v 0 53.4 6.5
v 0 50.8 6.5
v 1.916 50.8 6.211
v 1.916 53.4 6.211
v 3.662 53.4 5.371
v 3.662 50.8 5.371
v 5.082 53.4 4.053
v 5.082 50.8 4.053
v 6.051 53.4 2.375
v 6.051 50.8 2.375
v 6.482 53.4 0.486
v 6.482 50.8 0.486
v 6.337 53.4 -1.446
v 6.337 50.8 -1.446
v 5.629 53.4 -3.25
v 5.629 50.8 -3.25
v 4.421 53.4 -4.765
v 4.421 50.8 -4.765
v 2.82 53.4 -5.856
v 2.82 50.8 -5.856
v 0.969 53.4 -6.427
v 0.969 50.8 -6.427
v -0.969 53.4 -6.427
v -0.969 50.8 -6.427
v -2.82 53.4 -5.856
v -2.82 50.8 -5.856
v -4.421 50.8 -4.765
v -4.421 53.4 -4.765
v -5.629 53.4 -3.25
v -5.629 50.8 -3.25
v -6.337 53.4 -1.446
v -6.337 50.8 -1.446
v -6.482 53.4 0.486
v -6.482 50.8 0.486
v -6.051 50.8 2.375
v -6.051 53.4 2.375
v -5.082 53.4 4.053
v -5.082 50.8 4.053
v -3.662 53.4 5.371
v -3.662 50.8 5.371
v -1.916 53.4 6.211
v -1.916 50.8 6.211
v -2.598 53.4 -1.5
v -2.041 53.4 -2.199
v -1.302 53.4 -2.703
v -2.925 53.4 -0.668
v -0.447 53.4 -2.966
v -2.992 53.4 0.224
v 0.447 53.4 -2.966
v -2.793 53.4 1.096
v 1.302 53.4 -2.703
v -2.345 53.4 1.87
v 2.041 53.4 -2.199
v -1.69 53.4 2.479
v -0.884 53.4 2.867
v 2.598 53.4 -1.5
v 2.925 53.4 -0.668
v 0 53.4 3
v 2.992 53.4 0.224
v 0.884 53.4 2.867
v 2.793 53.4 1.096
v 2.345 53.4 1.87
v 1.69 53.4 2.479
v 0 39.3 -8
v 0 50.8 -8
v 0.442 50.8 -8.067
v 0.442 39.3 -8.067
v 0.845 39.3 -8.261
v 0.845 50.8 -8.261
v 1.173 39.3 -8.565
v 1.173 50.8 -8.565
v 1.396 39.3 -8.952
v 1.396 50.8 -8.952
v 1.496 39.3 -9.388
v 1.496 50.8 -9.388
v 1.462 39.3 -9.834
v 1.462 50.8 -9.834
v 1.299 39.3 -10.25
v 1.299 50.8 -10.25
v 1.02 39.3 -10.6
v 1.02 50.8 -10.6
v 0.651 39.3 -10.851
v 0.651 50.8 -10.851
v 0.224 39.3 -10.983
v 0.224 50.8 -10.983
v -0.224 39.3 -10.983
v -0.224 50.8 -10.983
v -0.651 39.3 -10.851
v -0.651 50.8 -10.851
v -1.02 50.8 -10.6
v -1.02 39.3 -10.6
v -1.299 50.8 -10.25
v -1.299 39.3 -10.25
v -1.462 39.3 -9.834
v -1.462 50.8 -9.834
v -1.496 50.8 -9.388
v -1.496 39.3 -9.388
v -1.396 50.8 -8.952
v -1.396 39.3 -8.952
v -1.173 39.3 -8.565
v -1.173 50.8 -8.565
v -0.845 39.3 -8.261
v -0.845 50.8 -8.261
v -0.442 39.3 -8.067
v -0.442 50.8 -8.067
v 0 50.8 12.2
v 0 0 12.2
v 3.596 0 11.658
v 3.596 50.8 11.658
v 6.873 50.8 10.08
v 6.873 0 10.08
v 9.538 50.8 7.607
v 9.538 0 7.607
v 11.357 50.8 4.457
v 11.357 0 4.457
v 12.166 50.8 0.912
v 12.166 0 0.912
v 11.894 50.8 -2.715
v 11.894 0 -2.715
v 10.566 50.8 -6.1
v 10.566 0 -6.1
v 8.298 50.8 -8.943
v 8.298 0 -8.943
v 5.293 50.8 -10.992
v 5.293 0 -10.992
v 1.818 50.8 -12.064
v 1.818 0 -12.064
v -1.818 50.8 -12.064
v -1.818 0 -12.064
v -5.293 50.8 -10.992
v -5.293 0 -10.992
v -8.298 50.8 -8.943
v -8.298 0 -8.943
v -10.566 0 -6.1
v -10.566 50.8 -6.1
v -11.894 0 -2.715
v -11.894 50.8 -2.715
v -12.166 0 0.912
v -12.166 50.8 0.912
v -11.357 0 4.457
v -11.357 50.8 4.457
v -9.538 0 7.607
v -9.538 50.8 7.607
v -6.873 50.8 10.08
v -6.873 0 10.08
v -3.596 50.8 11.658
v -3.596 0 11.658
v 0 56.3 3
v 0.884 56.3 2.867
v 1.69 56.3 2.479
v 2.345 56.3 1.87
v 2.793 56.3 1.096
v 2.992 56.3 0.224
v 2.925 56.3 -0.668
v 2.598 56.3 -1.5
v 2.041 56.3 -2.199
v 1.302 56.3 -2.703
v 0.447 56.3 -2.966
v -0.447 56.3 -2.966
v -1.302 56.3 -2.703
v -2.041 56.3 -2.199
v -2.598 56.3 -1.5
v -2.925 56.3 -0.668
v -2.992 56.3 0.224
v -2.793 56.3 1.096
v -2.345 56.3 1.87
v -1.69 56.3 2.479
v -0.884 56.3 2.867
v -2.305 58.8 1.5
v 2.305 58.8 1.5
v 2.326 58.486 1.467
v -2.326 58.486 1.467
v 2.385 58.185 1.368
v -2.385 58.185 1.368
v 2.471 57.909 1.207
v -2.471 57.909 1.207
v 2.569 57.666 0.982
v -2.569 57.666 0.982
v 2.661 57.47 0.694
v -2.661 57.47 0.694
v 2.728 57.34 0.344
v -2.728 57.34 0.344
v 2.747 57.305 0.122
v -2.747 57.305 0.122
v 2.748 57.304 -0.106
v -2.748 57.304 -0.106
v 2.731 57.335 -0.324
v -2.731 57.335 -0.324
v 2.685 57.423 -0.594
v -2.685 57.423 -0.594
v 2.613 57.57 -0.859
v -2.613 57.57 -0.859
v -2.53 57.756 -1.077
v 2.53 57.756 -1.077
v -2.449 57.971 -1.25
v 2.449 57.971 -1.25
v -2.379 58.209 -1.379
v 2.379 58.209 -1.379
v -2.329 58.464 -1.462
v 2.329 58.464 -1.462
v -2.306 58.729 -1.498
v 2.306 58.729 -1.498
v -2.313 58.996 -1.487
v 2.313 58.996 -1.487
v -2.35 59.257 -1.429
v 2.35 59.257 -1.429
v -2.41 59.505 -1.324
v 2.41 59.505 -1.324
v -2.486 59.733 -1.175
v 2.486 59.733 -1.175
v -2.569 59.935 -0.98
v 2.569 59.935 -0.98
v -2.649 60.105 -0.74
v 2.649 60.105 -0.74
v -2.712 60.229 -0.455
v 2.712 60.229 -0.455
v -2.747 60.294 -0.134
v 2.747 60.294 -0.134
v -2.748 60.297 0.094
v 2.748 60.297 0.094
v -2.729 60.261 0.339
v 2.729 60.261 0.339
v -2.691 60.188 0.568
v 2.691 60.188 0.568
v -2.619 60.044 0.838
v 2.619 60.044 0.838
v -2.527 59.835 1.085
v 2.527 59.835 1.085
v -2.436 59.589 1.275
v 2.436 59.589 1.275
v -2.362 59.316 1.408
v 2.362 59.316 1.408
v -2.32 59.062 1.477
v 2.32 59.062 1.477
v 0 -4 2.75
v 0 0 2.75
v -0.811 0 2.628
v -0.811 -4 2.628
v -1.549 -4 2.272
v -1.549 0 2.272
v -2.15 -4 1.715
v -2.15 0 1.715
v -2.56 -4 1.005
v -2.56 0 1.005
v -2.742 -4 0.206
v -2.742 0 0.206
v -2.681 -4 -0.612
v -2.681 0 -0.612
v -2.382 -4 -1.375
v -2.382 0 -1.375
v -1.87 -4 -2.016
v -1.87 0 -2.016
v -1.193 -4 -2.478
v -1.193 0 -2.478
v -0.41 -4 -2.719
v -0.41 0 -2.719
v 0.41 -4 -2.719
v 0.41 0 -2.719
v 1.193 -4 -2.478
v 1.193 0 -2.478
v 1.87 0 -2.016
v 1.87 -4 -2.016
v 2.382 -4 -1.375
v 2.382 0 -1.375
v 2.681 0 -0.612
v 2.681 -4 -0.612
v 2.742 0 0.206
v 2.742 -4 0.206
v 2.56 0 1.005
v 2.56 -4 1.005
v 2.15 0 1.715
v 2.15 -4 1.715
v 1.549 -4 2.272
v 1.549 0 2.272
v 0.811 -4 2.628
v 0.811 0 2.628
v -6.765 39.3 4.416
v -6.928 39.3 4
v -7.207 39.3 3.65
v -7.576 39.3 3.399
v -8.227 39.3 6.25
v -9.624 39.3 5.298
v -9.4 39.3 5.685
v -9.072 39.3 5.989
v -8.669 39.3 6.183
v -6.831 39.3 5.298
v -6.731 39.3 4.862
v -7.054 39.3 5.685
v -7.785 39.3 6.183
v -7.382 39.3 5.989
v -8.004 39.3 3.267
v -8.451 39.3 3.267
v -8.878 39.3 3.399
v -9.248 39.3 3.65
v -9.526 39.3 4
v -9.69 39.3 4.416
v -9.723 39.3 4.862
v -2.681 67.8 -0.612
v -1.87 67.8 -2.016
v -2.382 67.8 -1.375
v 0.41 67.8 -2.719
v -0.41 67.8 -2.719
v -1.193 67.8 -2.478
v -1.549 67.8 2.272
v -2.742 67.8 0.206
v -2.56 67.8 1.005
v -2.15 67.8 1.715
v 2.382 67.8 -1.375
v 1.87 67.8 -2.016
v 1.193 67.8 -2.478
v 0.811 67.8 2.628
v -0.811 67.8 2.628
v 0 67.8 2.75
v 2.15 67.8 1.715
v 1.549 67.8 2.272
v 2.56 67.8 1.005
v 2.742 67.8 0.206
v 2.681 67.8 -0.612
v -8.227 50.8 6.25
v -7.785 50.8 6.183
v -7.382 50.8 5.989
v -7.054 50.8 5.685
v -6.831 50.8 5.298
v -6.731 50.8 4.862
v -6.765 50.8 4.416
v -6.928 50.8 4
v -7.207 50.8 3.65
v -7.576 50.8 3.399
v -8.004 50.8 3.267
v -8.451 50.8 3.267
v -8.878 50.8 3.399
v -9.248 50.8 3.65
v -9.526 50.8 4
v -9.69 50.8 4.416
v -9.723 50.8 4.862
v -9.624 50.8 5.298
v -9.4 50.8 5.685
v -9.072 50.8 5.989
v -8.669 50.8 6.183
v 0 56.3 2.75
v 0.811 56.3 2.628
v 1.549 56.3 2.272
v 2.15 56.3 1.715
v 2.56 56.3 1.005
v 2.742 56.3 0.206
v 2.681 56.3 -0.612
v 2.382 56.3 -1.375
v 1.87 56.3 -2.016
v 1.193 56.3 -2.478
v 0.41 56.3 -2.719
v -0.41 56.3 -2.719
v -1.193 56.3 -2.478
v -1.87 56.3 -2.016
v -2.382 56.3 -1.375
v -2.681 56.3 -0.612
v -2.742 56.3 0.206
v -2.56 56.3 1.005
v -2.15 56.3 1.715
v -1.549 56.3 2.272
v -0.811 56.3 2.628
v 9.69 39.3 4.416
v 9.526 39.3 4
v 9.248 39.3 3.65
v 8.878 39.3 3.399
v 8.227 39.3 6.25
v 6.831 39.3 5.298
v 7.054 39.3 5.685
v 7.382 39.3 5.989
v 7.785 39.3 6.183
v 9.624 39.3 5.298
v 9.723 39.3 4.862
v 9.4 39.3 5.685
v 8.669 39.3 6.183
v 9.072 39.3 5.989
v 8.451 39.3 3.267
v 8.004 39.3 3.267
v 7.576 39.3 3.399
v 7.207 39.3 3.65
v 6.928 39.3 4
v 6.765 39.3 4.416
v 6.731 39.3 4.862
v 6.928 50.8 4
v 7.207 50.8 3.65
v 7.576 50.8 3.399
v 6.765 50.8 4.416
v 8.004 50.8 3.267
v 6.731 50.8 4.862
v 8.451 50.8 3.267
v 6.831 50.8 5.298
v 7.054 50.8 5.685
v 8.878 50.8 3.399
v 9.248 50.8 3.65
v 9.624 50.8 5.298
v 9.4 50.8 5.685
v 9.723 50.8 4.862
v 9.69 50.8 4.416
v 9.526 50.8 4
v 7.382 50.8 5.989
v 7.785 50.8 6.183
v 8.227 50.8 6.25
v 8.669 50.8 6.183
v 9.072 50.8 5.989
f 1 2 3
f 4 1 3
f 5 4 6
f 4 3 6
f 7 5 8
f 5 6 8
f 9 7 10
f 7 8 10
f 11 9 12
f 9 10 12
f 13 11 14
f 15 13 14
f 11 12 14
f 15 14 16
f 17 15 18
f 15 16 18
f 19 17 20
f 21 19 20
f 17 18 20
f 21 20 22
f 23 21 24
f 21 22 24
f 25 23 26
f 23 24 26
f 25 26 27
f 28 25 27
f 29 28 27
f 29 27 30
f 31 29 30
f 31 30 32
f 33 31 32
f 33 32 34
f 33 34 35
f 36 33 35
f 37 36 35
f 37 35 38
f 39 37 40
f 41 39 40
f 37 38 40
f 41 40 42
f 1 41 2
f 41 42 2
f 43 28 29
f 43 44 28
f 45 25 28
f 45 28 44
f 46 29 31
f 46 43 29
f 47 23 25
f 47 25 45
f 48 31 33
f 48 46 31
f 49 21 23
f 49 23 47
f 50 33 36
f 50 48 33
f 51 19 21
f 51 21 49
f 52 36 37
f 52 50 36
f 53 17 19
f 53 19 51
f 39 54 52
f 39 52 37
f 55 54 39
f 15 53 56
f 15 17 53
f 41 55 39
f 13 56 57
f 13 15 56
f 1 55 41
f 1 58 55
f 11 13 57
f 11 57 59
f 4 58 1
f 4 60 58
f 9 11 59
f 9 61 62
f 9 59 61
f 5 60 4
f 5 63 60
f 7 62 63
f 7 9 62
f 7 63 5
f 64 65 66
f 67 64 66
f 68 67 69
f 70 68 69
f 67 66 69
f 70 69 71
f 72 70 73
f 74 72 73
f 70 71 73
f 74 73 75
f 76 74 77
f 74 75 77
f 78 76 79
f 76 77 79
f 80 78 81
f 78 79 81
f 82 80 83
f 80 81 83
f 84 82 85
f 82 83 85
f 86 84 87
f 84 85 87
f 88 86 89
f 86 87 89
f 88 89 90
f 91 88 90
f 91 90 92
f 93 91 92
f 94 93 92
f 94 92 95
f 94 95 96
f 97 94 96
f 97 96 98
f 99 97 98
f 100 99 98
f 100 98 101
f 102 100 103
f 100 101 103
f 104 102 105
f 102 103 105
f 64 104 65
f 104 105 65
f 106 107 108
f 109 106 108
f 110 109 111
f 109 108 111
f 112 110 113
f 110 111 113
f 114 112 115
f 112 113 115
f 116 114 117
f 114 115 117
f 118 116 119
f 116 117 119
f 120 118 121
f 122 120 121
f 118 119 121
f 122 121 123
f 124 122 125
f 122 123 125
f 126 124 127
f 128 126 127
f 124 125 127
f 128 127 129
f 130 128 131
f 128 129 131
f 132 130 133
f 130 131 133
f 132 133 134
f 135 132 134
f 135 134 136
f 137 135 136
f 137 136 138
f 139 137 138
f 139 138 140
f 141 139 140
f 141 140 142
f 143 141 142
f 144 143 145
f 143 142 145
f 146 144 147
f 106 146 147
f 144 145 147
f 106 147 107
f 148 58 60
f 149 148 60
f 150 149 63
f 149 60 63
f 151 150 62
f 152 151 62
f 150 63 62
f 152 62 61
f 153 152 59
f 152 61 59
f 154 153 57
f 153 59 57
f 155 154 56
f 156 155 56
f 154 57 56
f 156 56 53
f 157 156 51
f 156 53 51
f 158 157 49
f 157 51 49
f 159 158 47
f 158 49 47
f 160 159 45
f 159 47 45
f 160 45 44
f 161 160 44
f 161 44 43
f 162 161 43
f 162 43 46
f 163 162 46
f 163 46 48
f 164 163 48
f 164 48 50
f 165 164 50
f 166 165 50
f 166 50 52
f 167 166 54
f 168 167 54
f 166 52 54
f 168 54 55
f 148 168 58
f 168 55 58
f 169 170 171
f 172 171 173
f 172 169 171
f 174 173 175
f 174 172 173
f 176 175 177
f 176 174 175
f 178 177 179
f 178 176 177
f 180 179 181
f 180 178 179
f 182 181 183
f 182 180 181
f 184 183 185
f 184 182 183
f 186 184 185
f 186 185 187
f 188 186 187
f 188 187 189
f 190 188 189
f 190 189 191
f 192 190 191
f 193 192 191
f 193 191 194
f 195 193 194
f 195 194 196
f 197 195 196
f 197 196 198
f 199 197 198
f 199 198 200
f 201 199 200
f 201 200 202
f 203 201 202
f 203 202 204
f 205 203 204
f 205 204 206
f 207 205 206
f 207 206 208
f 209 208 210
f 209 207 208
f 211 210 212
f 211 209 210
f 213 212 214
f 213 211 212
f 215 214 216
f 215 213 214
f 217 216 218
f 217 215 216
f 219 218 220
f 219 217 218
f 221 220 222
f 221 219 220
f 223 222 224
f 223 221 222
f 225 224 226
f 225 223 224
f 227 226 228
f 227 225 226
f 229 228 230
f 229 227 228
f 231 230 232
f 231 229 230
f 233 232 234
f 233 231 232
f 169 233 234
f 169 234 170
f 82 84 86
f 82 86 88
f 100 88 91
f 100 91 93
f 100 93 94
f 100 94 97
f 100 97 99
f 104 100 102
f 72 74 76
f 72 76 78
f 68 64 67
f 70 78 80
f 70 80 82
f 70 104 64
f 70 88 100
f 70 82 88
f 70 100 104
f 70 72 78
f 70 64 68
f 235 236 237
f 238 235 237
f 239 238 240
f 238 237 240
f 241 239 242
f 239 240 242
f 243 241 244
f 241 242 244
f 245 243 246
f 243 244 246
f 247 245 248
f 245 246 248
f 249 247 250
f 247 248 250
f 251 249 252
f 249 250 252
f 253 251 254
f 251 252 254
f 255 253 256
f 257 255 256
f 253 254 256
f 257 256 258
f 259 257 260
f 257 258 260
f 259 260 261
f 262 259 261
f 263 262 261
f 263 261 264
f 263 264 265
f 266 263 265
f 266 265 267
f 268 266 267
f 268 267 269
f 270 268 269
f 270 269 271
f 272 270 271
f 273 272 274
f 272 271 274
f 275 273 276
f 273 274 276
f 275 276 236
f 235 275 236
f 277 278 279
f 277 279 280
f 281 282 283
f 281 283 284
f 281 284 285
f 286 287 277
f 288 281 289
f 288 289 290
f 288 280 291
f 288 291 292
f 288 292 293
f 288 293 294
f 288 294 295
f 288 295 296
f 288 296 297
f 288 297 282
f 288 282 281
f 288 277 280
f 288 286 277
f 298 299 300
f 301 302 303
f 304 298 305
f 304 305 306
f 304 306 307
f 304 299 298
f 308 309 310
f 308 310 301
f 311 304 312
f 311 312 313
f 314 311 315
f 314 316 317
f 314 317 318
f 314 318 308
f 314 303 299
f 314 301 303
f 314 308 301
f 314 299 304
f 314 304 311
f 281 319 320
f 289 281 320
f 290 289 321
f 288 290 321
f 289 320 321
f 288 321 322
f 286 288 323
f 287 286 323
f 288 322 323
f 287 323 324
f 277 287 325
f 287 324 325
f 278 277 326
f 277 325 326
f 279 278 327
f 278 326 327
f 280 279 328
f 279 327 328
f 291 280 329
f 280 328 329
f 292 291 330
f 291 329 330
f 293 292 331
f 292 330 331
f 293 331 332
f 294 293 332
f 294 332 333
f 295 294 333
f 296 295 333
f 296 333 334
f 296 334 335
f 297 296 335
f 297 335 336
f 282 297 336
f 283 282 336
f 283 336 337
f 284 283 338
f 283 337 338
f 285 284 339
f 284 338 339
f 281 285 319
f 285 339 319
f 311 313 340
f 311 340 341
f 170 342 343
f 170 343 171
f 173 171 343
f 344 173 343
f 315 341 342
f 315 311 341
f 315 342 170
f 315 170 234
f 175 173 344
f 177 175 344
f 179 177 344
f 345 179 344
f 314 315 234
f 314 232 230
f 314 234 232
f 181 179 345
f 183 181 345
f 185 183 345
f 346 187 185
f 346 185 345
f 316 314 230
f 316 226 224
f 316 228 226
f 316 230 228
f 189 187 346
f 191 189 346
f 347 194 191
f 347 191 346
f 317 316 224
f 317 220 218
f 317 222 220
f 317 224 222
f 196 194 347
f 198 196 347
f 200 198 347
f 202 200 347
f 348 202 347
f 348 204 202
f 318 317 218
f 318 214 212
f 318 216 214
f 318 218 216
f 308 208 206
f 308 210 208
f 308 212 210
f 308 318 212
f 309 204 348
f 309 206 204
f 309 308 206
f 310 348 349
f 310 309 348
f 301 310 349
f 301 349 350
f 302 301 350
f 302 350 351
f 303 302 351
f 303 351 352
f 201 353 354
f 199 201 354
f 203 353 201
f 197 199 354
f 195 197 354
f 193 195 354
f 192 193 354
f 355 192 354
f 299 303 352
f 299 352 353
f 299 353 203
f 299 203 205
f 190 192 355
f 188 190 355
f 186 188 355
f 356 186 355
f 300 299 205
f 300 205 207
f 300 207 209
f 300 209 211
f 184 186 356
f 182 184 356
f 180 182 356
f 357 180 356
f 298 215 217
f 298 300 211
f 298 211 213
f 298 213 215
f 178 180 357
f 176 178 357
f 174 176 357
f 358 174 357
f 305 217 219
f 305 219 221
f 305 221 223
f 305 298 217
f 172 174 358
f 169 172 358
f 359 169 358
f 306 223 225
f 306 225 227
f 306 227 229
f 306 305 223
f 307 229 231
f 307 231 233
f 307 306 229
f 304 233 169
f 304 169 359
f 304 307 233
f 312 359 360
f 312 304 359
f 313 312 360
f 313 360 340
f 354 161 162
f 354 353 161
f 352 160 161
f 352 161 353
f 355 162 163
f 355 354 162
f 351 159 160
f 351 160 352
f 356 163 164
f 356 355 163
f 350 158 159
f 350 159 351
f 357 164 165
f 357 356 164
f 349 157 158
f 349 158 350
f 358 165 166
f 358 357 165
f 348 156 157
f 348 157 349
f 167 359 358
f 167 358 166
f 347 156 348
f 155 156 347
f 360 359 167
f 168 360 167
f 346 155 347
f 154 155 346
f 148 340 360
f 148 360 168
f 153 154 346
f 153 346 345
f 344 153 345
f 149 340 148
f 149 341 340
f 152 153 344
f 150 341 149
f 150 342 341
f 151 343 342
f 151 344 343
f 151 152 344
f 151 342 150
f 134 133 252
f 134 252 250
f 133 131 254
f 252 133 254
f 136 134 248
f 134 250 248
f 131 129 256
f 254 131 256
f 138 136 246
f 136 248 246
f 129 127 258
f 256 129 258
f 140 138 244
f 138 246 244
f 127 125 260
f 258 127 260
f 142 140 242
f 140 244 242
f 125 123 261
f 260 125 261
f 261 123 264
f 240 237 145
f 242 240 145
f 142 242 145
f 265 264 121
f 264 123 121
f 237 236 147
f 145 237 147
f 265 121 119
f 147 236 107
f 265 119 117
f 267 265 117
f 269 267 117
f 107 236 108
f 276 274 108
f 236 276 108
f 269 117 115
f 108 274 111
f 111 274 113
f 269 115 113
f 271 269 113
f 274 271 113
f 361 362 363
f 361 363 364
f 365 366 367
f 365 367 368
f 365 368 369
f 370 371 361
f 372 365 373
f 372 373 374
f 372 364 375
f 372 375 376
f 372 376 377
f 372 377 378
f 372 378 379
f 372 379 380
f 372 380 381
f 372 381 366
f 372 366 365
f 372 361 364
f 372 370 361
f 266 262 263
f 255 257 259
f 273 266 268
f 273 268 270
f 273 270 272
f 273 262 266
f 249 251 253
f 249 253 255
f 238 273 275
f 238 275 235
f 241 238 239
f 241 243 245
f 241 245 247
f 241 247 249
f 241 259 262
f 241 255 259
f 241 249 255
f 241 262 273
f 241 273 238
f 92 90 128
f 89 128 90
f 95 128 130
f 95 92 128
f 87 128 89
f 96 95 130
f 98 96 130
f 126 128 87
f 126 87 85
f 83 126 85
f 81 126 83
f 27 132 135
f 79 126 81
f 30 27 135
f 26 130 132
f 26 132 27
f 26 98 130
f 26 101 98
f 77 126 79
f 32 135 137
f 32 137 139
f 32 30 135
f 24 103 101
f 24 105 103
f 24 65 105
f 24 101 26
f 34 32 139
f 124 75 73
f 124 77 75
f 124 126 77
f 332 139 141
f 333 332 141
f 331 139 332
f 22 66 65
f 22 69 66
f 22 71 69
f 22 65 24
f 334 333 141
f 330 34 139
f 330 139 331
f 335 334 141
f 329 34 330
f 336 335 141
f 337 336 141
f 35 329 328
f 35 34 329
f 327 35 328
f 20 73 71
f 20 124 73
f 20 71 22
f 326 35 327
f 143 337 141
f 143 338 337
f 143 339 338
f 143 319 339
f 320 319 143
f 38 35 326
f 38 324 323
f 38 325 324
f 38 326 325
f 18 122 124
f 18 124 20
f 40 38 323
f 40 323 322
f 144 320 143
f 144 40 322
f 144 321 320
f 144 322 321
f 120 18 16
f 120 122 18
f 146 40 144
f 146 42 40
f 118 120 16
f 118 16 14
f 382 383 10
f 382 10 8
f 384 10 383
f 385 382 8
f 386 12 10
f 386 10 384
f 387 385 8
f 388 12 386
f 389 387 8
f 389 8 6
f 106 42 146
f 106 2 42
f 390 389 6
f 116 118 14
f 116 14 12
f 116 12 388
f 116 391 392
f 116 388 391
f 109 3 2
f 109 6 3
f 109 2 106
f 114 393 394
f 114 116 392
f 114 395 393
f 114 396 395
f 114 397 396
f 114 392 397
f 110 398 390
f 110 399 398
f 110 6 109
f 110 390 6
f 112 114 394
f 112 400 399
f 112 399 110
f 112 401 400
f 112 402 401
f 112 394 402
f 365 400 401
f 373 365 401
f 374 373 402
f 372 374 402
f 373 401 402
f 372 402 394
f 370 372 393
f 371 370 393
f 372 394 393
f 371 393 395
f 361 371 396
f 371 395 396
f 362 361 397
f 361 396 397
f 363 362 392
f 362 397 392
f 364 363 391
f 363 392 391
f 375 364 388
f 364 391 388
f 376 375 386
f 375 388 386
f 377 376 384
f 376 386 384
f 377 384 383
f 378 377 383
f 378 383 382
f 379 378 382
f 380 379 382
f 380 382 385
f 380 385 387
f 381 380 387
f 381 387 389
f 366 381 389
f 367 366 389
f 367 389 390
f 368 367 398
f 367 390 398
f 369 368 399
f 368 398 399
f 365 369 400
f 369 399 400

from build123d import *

# Parameters (mm, degrees)
SKETCH_1_R               = 12.2
EXTRUDE_1_DEPTH          = 50.8
SKETCH_2_R               = 2.75
EXTRUDE_2_DEPTH          = 4
SKETCH_4_R               = 6.5
EXTRUDE_3_DEPTH          = 2.6
SKETCH_5_R               = 3
EXTRUDE_4_DEPTH          = 2.9
EXTRUDE_START            = 11.5
SKETCH_6_R               = 2.75
EXTRUDE_5_DEPTH          = 11.5
CUT_EXTRUDE_1_DEPTH      = 11.5
CUT_EXTRUDE_1_DEPTH_BACK = 11.5
SKETCH_7_R               = 1.5
SKETCH_8_R               = 1.5
CUT_EXTRUDE_2_DEPTH      = 11.5


with BuildPart() as part:
    # 草图1 → 凸台-拉伸1 (new body)
    with BuildSketch(Plane(origin=(0, 0, 0), x_dir=(1, 0, 0), z_dir=(0, 1, 0))):
        Circle(SKETCH_1_R)
    extrude(amount=EXTRUDE_1_DEPTH)

    # 草图2 → 凸台-拉伸2 (add)
    with BuildSketch(Plane.XZ):
        Circle(SKETCH_2_R)
    extrude(amount=EXTRUDE_2_DEPTH)

    # 草图4 → 凸台-拉伸3 (add)
    with BuildSketch(Plane(origin=(0, 50.8, 0), x_dir=(1, 0, 0), z_dir=(0, 1, 0))):
        Circle(SKETCH_4_R)
    extrude(amount=EXTRUDE_3_DEPTH)

    # 草图5 → 凸台-拉伸4 (add)
    with BuildSketch(Plane(origin=(0, 53.4, 0), x_dir=(1, 0, 0), z_dir=(0, 1, 0))):
        Circle(SKETCH_5_R)
    extrude(amount=EXTRUDE_4_DEPTH)

    # 草图6 → 凸台-拉伸5 (add)
    with BuildSketch(Plane(origin=(0, 56.3, 0), x_dir=(1, 0, 0), z_dir=(0, 1, 0)).offset(EXTRUDE_START)):
        Circle(SKETCH_6_R)
    extrude(amount=-EXTRUDE_5_DEPTH)

    # 草图7 → 切除-拉伸1 (cut, two sides: drawn at the far end of the back side and taken through both)
    with BuildSketch(Plane(origin=(0, 0, 0), x_dir=(0, 0, -1), z_dir=(1, 0, 0)).offset(-CUT_EXTRUDE_1_DEPTH_BACK)):
        with Locations((0, 58.8)):
            Circle(SKETCH_7_R)
    extrude(amount=CUT_EXTRUDE_1_DEPTH + CUT_EXTRUDE_1_DEPTH_BACK, mode=Mode.SUBTRACT)

    # 草图8 → 切除-拉伸2 (cut)
    with BuildSketch(Plane(origin=(0, 50.8, 0), x_dir=(1, 0, 0), z_dir=(0, 1, 0))):
        with Locations((0, 9.5)):
            Circle(SKETCH_8_R)
        with Locations((8.227241336, -4.75)):
            Circle(SKETCH_8_R)
        with Locations((-8.227241336, -4.75)):
            Circle(SKETCH_8_R)
    extrude(amount=-CUT_EXTRUDE_2_DEPTH, mode=Mode.SUBTRACT)


solid = part.part
